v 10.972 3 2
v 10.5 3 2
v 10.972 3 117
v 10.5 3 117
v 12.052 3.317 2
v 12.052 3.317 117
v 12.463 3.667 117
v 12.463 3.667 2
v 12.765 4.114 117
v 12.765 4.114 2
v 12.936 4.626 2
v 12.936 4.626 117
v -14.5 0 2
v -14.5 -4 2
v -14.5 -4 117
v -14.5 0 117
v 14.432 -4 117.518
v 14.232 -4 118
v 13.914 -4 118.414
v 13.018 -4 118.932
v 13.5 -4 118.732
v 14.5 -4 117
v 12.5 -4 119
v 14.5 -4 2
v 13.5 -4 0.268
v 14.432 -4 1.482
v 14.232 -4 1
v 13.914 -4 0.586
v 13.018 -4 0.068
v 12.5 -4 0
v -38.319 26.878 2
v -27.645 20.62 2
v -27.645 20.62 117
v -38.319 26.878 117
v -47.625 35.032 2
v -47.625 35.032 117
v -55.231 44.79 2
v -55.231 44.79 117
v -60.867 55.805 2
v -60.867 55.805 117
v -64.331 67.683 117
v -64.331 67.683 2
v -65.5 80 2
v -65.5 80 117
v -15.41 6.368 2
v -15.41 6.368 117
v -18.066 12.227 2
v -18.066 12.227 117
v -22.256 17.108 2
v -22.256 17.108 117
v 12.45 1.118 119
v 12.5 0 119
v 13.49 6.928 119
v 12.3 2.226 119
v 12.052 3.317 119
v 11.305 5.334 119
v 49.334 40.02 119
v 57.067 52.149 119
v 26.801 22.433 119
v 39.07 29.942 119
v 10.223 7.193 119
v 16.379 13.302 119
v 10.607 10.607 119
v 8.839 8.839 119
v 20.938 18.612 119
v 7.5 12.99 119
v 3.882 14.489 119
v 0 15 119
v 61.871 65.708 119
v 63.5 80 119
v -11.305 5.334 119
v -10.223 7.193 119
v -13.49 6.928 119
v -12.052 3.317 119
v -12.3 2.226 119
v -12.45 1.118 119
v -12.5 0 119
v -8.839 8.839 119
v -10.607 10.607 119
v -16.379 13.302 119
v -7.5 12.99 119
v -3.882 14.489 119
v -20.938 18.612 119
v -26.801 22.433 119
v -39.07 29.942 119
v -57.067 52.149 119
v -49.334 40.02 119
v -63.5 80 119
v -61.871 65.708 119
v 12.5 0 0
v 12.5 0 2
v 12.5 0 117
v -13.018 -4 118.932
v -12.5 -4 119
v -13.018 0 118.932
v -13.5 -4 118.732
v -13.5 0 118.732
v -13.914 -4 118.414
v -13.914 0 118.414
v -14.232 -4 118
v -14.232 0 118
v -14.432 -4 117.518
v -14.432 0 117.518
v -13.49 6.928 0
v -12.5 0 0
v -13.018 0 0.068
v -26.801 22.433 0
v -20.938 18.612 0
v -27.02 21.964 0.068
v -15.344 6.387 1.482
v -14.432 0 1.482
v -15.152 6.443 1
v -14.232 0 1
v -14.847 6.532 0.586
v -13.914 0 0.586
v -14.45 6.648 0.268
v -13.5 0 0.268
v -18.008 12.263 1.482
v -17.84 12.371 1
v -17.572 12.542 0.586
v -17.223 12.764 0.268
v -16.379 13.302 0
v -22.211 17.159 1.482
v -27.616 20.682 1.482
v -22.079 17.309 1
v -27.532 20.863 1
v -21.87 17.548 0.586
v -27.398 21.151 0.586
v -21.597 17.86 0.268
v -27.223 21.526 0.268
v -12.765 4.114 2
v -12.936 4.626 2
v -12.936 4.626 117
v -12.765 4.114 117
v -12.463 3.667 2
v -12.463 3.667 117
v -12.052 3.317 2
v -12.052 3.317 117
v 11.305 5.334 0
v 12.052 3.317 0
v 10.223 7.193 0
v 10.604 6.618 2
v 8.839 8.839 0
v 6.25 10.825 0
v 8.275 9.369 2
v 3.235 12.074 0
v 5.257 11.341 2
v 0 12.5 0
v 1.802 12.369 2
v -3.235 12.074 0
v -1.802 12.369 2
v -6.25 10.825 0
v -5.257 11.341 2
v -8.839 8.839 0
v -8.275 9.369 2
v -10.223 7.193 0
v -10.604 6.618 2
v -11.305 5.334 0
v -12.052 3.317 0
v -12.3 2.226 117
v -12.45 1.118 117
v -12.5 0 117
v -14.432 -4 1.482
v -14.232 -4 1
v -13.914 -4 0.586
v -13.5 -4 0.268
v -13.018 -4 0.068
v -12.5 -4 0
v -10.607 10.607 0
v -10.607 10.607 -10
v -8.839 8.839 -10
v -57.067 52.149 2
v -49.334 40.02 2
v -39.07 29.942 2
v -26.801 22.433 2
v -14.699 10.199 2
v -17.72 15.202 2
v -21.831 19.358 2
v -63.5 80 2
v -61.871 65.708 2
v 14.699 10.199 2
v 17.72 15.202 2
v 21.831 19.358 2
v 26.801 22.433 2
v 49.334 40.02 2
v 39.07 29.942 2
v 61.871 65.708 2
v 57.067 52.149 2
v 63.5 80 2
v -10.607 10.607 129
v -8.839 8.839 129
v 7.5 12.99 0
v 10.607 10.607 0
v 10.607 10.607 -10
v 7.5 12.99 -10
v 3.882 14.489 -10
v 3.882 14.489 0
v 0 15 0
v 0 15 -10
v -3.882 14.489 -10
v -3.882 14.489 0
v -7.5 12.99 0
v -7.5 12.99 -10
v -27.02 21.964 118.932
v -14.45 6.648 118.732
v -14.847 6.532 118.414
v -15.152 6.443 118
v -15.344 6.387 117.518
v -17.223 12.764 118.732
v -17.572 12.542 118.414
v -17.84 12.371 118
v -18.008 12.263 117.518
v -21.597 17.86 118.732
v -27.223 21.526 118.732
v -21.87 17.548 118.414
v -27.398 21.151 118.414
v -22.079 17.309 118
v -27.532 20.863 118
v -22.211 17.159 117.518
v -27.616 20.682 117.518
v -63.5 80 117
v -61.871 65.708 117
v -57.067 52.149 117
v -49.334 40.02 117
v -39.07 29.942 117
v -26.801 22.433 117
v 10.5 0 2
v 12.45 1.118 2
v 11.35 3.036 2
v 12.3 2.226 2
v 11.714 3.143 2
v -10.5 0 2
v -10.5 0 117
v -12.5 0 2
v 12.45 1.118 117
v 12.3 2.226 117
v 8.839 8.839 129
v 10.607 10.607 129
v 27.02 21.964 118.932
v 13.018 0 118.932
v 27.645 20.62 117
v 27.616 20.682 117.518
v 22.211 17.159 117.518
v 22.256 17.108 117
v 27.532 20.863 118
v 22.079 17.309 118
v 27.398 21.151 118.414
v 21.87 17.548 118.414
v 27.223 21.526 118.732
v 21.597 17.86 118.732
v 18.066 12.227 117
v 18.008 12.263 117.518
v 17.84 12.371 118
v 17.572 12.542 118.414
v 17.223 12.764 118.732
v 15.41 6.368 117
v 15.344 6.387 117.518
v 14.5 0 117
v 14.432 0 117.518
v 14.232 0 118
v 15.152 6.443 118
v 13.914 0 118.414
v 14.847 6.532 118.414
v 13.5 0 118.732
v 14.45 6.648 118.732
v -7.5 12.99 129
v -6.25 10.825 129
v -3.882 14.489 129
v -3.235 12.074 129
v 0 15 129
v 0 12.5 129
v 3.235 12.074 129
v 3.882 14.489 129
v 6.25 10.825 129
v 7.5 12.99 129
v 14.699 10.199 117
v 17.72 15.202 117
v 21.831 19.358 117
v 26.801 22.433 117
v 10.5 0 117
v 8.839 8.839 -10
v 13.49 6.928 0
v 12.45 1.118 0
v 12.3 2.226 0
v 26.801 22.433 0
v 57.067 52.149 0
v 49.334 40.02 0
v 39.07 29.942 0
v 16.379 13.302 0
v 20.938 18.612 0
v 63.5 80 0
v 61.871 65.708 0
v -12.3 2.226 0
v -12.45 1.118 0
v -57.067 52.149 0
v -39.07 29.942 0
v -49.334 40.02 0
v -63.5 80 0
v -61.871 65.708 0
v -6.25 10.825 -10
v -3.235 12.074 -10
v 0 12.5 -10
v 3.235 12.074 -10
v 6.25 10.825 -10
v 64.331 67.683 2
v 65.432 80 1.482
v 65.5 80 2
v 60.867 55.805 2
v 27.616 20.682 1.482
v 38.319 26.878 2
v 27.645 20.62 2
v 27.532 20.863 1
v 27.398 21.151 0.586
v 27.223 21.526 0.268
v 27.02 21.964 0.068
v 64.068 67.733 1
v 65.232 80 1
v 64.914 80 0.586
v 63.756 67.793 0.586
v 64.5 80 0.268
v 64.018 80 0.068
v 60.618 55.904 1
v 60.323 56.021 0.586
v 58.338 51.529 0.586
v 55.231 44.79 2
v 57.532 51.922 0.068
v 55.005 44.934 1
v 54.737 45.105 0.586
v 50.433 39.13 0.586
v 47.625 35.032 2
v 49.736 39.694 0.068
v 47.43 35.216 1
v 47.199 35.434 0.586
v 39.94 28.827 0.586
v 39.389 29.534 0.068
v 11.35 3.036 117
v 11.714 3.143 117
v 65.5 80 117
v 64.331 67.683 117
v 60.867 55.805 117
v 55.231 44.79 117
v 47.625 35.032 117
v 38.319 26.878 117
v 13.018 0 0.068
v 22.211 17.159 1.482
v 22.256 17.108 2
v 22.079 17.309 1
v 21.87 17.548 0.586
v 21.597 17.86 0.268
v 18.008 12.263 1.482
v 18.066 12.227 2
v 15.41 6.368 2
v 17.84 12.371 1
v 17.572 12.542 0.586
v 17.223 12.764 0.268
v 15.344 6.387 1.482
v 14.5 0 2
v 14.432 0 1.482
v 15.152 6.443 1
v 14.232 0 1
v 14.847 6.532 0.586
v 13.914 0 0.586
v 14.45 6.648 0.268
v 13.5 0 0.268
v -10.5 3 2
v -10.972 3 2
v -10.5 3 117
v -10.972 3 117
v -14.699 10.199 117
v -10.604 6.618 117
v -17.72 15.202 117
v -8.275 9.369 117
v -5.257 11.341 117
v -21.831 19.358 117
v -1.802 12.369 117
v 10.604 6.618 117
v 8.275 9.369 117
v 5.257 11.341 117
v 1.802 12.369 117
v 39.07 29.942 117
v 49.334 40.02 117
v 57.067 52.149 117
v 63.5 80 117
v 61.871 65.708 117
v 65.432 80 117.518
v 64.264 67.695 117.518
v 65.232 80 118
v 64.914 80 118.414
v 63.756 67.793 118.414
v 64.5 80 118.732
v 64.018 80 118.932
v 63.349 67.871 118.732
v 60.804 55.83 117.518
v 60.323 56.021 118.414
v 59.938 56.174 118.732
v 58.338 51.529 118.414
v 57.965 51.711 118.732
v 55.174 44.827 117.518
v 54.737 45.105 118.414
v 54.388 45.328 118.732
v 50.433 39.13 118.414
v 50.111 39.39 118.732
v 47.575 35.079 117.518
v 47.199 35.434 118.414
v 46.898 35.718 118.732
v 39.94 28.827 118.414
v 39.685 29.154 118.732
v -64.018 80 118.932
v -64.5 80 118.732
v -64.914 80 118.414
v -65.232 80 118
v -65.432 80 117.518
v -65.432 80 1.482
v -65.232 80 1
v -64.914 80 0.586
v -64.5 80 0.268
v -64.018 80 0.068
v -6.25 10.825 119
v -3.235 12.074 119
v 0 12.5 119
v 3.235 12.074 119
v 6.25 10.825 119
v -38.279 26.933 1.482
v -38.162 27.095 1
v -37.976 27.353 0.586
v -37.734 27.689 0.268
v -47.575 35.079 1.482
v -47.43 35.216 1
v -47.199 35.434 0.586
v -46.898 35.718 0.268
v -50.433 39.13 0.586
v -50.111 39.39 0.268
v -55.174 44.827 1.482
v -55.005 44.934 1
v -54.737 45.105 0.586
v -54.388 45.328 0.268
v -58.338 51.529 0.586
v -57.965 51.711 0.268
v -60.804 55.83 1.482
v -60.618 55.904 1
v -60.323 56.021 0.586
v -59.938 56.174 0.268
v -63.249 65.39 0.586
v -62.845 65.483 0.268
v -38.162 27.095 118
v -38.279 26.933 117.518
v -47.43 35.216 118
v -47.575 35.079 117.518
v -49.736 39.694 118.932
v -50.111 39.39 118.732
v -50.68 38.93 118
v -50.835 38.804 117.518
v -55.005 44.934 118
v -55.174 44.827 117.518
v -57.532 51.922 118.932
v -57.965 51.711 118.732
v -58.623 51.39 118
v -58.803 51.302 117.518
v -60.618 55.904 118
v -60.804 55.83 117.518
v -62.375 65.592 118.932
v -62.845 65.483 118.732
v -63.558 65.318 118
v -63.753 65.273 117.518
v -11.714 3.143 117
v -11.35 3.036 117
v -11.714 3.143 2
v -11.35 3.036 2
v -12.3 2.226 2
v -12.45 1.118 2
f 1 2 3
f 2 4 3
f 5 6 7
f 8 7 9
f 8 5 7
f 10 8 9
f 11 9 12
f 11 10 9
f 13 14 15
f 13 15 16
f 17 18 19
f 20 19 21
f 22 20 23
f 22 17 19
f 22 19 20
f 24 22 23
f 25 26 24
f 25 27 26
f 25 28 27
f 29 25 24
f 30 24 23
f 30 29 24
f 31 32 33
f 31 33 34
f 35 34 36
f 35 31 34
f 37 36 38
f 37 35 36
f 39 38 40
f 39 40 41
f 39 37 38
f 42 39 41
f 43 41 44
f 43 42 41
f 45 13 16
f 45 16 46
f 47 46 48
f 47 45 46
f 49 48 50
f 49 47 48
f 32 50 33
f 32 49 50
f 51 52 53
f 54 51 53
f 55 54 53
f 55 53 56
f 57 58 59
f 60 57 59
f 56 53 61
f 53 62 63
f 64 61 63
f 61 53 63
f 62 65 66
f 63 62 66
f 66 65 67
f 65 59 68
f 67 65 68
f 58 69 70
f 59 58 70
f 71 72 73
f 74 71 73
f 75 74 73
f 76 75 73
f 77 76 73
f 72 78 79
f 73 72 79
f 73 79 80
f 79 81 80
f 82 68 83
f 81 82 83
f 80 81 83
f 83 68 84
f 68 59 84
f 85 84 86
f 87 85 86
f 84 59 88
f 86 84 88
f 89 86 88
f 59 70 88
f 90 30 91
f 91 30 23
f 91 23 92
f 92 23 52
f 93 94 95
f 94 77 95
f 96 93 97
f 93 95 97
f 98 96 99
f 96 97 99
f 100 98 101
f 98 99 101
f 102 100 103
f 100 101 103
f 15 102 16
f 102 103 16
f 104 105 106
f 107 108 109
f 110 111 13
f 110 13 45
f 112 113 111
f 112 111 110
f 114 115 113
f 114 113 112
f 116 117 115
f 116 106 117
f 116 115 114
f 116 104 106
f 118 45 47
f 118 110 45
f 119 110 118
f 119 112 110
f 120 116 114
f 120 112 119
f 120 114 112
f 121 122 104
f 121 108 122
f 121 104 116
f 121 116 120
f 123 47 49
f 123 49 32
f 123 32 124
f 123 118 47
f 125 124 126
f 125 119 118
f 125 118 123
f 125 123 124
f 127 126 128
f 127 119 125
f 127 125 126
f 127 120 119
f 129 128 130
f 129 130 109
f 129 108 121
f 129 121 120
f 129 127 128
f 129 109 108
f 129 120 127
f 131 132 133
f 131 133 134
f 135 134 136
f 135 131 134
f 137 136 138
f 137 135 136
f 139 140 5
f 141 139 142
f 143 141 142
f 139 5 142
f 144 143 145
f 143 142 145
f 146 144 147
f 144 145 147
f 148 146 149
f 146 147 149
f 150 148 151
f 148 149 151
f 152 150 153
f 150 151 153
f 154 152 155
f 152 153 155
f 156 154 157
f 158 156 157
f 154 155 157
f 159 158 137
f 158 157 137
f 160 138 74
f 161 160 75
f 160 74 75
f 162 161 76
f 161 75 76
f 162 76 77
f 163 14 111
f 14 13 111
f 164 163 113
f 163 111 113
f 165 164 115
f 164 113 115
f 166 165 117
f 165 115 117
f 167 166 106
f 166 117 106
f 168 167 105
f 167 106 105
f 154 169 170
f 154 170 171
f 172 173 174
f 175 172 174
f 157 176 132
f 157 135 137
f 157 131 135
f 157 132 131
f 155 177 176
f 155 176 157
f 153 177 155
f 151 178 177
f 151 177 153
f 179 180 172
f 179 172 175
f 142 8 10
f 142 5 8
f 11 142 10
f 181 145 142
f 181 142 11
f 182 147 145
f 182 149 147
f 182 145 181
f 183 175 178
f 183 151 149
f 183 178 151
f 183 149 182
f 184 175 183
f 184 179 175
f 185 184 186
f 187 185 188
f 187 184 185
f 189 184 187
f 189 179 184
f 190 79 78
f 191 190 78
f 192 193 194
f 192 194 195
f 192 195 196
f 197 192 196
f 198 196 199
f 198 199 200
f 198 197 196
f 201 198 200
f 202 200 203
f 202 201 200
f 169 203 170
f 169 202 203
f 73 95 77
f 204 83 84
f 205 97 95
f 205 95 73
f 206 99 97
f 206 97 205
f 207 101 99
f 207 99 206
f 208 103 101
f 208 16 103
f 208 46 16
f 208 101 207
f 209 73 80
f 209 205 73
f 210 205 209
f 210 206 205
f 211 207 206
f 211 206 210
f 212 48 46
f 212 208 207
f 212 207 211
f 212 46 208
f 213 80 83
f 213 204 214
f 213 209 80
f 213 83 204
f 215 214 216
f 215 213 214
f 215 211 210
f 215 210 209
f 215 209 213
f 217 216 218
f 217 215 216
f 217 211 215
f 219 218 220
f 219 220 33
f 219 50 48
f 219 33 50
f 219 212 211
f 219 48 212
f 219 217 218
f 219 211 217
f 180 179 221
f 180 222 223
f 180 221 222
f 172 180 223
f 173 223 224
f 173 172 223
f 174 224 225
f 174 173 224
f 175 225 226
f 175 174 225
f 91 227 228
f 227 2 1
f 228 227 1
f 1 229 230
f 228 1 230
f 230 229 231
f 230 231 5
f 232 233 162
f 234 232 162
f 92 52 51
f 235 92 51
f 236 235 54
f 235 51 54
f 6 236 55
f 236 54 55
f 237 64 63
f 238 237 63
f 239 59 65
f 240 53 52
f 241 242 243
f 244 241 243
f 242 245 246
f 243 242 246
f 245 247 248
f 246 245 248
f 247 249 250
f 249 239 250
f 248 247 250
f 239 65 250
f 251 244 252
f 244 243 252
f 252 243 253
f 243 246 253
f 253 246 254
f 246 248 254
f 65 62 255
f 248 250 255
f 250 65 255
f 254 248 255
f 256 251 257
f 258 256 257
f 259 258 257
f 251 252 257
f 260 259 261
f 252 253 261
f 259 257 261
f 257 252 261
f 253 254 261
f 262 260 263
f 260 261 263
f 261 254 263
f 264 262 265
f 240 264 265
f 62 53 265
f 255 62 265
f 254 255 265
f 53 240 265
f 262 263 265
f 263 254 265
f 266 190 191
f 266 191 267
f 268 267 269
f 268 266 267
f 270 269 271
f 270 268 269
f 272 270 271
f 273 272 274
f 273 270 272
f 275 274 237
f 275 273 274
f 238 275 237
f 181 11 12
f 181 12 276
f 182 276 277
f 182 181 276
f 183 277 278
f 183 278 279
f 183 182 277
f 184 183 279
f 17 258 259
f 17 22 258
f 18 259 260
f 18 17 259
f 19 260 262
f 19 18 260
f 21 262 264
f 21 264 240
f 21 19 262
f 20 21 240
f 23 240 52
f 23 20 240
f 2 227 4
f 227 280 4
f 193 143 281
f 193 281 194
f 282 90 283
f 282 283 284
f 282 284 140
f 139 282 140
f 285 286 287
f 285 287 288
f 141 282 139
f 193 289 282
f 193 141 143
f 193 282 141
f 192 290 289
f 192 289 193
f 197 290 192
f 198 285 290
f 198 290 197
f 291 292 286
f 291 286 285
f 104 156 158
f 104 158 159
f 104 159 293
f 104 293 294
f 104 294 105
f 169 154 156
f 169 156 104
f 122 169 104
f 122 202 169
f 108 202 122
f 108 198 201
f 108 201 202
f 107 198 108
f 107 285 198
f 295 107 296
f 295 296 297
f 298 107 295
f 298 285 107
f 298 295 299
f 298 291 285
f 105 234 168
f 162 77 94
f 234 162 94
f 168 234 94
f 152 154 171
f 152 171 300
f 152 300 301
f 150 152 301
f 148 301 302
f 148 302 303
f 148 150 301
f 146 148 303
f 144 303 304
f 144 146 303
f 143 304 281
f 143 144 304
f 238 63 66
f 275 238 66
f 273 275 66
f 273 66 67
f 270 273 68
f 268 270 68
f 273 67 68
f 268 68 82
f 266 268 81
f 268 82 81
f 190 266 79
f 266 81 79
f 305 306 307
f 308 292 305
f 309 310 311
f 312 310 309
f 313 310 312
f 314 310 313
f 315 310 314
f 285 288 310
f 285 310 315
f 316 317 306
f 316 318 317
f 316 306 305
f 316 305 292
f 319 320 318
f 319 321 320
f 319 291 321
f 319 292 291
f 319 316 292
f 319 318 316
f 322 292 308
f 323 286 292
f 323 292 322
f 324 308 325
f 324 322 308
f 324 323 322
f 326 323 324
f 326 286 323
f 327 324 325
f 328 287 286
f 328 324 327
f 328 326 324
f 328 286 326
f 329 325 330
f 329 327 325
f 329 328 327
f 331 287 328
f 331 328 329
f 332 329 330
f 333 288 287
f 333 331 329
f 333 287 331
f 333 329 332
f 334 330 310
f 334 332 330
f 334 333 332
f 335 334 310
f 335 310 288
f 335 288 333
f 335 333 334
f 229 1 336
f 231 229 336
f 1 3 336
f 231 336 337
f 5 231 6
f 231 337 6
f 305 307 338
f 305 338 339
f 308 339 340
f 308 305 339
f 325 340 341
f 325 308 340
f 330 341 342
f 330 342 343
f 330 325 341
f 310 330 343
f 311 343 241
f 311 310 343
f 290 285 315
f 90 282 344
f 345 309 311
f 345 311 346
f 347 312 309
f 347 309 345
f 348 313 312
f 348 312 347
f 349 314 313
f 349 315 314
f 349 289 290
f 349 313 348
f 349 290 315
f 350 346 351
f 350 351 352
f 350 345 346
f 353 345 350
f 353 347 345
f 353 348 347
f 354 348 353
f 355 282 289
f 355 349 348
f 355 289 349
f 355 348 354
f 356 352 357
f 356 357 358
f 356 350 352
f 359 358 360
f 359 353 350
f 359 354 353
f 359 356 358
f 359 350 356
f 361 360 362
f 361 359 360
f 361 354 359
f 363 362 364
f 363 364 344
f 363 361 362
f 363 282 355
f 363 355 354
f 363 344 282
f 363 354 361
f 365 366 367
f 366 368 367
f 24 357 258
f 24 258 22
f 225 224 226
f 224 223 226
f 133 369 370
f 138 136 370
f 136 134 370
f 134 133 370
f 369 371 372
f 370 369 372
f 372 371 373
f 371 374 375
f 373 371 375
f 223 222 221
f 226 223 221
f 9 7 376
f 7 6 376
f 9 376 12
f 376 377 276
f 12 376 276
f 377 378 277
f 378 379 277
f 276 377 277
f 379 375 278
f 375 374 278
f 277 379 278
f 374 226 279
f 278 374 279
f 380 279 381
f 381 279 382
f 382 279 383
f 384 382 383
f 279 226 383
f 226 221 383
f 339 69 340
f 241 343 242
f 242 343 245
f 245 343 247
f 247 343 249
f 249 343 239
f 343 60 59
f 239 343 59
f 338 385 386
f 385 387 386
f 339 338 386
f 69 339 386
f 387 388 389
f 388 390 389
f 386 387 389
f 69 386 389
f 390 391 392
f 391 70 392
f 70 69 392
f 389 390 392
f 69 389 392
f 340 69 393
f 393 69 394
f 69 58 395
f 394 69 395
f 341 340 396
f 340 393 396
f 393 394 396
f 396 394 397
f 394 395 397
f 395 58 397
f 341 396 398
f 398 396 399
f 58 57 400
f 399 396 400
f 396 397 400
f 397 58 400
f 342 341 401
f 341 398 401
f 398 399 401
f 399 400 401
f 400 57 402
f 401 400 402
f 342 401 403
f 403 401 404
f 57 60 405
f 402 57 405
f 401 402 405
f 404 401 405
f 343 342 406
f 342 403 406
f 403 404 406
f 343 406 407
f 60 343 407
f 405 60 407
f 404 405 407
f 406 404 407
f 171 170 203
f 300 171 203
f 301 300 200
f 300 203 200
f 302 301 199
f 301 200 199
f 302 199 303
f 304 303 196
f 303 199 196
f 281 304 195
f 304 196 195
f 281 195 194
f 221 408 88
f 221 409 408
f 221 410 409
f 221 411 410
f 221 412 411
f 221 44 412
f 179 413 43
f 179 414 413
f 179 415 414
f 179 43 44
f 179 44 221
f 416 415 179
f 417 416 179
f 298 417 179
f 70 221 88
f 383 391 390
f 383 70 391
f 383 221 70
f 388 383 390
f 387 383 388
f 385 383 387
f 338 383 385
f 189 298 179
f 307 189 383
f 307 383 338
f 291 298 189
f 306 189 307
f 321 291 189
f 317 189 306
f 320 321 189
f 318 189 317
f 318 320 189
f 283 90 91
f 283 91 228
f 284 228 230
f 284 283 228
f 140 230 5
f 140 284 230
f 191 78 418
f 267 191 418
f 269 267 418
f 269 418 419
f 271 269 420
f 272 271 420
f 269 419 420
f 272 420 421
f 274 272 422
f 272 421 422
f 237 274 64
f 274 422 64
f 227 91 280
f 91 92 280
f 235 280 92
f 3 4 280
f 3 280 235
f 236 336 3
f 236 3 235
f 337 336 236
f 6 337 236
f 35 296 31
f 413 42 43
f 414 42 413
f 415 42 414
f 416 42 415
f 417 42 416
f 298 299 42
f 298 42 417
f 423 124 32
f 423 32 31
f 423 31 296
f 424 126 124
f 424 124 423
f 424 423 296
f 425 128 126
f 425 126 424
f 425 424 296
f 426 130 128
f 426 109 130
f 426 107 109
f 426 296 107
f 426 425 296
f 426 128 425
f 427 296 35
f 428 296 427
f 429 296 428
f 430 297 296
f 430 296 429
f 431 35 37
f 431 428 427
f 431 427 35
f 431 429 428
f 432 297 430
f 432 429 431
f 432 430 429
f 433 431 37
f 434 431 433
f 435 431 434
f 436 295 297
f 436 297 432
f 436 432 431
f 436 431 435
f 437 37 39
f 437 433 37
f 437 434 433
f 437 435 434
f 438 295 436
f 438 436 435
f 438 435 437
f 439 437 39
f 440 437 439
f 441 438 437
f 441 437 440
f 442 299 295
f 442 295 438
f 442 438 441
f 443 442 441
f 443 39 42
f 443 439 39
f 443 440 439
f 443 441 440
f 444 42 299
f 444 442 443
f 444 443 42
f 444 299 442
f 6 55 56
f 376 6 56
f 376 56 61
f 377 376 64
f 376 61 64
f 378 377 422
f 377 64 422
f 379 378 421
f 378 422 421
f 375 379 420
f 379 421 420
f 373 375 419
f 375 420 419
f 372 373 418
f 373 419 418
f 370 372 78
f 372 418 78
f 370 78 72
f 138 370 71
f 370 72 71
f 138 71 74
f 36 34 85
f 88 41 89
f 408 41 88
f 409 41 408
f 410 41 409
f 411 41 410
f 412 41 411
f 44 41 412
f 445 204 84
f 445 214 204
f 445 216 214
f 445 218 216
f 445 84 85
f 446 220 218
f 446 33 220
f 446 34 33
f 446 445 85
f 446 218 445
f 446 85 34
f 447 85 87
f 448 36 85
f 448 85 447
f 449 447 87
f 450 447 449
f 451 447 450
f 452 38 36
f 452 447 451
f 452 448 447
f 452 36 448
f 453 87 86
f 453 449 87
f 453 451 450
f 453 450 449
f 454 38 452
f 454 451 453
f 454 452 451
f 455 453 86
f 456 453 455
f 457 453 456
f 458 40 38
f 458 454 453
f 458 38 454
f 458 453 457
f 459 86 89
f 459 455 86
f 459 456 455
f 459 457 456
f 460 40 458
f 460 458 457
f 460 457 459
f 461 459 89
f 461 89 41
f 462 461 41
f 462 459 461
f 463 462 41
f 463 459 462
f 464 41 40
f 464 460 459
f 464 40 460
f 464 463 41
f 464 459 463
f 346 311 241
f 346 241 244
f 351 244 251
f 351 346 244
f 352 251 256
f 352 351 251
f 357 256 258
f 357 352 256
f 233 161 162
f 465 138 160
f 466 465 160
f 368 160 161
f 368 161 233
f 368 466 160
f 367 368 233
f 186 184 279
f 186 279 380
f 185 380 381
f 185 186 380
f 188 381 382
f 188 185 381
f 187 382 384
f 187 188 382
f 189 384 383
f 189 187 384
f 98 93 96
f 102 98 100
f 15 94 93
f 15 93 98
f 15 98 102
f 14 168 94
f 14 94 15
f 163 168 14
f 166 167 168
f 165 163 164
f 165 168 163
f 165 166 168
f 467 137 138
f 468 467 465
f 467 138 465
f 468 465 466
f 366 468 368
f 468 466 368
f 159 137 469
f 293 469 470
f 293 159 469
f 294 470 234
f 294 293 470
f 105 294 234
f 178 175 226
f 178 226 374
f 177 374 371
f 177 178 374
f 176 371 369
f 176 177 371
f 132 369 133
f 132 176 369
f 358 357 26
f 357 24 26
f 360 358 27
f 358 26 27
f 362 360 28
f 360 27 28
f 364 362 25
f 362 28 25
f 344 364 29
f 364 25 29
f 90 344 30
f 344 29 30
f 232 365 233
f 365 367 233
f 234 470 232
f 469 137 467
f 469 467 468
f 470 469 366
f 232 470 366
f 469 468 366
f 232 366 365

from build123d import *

# Parameters (mm, degrees)
ESTRUSIONE_ESTRUSIONE1_DEPTH   = 119
ESTRUSIONE_ESTRUSIONE1_2_DEPTH = 119
ESTRUSIONE_ESTRUSIONE2_DEPTH   = 2
ESTRUSIONE_ESTRUSIONE4_START   = -119
ESTRUSIONE_ESTRUSIONE4_DEPTH   = 2
RACCORDO1_R                    = 2
TAGLIO_ESTRUSIONE1_DEPTH       = 120.0000001
TAGLIO_ESTRUSIONE2_DEPTH       = 2
TAGLIO_ESTRUSIONE3_DEPTH       = 2
ESTRUSIONE_ESTRUSIONE5_DEPTH   = 10
ESTRUSIONE_ESTRUSIONE6_DEPTH   = 10


with BuildPart() as part:
    # Schizzo1 → Estrusione-Estrusione1 (new body)
    with BuildSketch(Plane.XY):
        with BuildLine():
            Line((-65.5, 80), (-63.5, 80))
            ThreePointArc((-63.5, 80), (-53.544927077, 45.865108989), (-26.801077658, 22.433062993))
            ThreePointArc((-26.801077658, 22.433062993), (-17.720444684, 15.202229716), (-12.936270867, 4.626099707))
            ThreePointArc((-12.936270867, 4.626099707), (-12.246718209, 3.459253333), (-10.971532063, 3))
            Line((-10.971532063, 3), (-10.5, 3))
            Line((-10.5, 3), (-10.5, 0))
            Line((-10.5, 0), (-12.5, 0))
            Line((-12.5, 0), (-12.5, -4))
            Line((-12.5, -4), (-14.5, -4))
            Line((-14.5, -4), (-14.5, 0))
            ThreePointArc((-14.5, 0), (-18.06581275, 12.226794372), (-27.645206088, 20.619931119))
            ThreePointArc((-27.645206088, 20.619931119), (-55.231381473, 44.789994311), (-65.5, 80))
        make_face()
    extrude(amount=ESTRUSIONE_ESTRUSIONE1_DEPTH)



with BuildPart() as body_2:
    # Schizzo1 → Estrusione-Estrusione1 2 (new body)
    with BuildSketch(Plane.XY):
        with BuildLine():
            Line((63.5, 80), (65.5, 80))
            ThreePointArc((65.5, 80), (55.231381473, 44.789994311), (27.645206088, 20.619931119))
            ThreePointArc((27.645206088, 20.619931119), (18.06581275, 12.226794372), (14.5, 0))
            Line((14.5, 0), (14.5, -4))
            Line((14.5, -4), (12.5, -4))
            Line((12.5, -4), (12.5, 0))
            Line((12.5, 0), (10.5, 0))
            Line((10.5, 0), (10.5, 3))
            Line((10.5, 3), (10.971532063, 3))
            ThreePointArc((10.971532063, 3), (12.246718209, 3.459253333), (12.936270867, 4.626099707))
            ThreePointArc((12.936270867, 4.626099707), (17.720444684, 15.202229716), (26.801077658, 22.433062993))
            ThreePointArc((26.801077658, 22.433062993), (53.544927077, 45.865108989), (63.5, 80))
        make_face()
    extrude(amount=ESTRUSIONE_ESTRUSIONE1_2_DEPTH)


with BuildPart() as part_1:
    add(part.part)

    add(body_2.part)  # Estrusione-Estrusione2 merges body 2
    # Schizzo2 → Estrusione-Estrusione2 (add)
    with BuildSketch(Plane.XY.offset(119)):
        with BuildLine():
            Line((65.5, 80), (-65.5, 80))
            ThreePointArc((-65.5, 80), (-55.231381473, 44.789994311), (-27.645206088, 20.619931119))
            ThreePointArc((-27.645206088, 20.619931119), (-18.06581275, 12.226794372), (-14.5, 0))
            Line((-14.5, 0), (-14.5, -4))
            Line((-14.5, -4), (14.5, -4))
            Line((14.5, -4), (14.5, 0))
            ThreePointArc((14.5, 0), (18.06581275, 12.226794372), (27.645206088, 20.619931119))
            ThreePointArc((27.645206088, 20.619931119), (55.231381473, 44.789994311), (65.5, 80))
        make_face()
    extrude(amount=-ESTRUSIONE_ESTRUSIONE2_DEPTH)

    # Schizzo2<4> → Estrusione-Estrusione4 (add)
    with BuildSketch(Plane.XY.offset(119).offset(ESTRUSIONE_ESTRUSIONE4_START)):
        with BuildLine():
            ThreePointArc((27.645206088, 20.619931119), (55.231381473, 44.789994311), (65.5, 80))
            Line((65.5, 80), (63.5, 80))
            ThreePointArc((63.5, 80), (53.544927077, 45.865108989), (26.801077658, 22.433062993))
            ThreePointArc((26.801077658, 22.433062993), (17.720444684, 15.202229716), (12.936270867, 4.626099707))
            ThreePointArc((12.936270867, 4.626099707), (12.246718209, 3.459253333), (10.971532063, 3))
            Line((10.971532063, 3), (10.5, 3))
            Line((10.5, 3), (10.5, 0))
            Line((10.5, 0), (12.5, 0))
            Line((12.5, 0), (12.5, -4))
            Line((12.5, -4), (14.5, -4))
            Line((14.5, -4), (14.5, 0))
            ThreePointArc((14.5, 0), (18.06581275, 12.226794372), (27.645206088, 20.619931119))
        make_face()
        with BuildLine():
            ThreePointArc((26.801077658, 22.433062993), (53.544927077, 45.865108989), (63.5, 80))
            Line((63.5, 80), (-63.5, 80))
            ThreePointArc((-63.5, 80), (-53.544927077, 45.865108989), (-26.801077658, 22.433062993))
            ThreePointArc((-26.801077658, 22.433062993), (-17.720444684, 15.202229716), (-12.936270867, 4.626099707))
            ThreePointArc((-12.936270867, 4.626099707), (-12.246718209, 3.459253333), (-10.971532063, 3))
            Line((-10.971532063, 3), (-10.5, 3))
            Line((-10.5, 3), (-10.5, 0))
            Line((-10.5, 0), (-12.5, 0))
            Line((-12.5, 0), (-12.5, -4))
            Line((-12.5, -4), (12.5, -4))
            Line((12.5, -4), (12.5, 0))
            Line((12.5, 0), (10.5, 0))
            Line((10.5, 0), (10.5, 3))
            Line((10.5, 3), (10.971532063, 3))
            ThreePointArc((10.971532063, 3), (12.246718209, 3.459253333), (12.936270867, 4.626099707))
            ThreePointArc((12.936270867, 4.626099707), (17.720444684, 15.202229716), (26.801077658, 22.433062993))
        make_face()
        with BuildLine():
            ThreePointArc((-26.801077658, 22.433062993), (-53.544927077, 45.865108989), (-63.5, 80))
            Line((-63.5, 80), (-65.5, 80))
            ThreePointArc((-65.5, 80), (-55.231381473, 44.789994311), (-27.645206088, 20.619931119))
            ThreePointArc((-27.645206088, 20.619931119), (-18.06581275, 12.226794372), (-14.5, 0))
            Line((-14.5, 0), (-14.5, -4))
            Line((-14.5, -4), (-12.5, -4))
            Line((-12.5, -4), (-12.5, 0))
            Line((-12.5, 0), (-10.5, 0))
            Line((-10.5, 0), (-10.5, 3))
            Line((-10.5, 3), (-10.971532063, 3))
            ThreePointArc((-10.971532063, 3), (-12.246718209, 3.459253333), (-12.936270867, 4.626099707))
            ThreePointArc((-12.936270867, 4.626099707), (-17.720444684, 15.202229716), (-26.801077658, 22.433062993))
        make_face()
    extrude(amount=ESTRUSIONE_ESTRUSIONE4_DEPTH)

    # Raccordo1
    raccordo1_edges = [part_1.edges().sort_by_distance(p)[0] for p in [
        (-14.5, -2, 0),
        (-18.06581275, 12.226794372, 0),
        (-55.231381473, 44.789994311, 0),
        (-55.231381473, 44.789994311, 119),
        (-18.06581275, 12.226794372, 119),
        (-14.5, -2, 119),
        (14.5, -2, 119),
        (55.231381473, 44.789994311, 119),
        (18.06581275, 12.226794372, 119),
        (55.231381473, 44.789994311, 0),
        (14.5, -2, 0),
        (18.06581275, 12.226794372, 0),
    ]]
    fillet(raccordo1_edges, radius=RACCORDO1_R)

    # Schizzo3 → Taglio-Estrusione1 (cut, through all)
    with BuildSketch(Plane.XY.offset(119)):
        with BuildLine():
            Line((-12.5, 0), (-12.5, -4))
            Line((-12.5, -4), (12.5, -4))
            Line((12.5, -4), (12.5, 0))
            Line((12.5, 0), (10.5, 0))
            Line((10.5, 0), (10.5, 3))
            Line((10.5, 3), (10.971532063, 3))
            ThreePointArc((10.971532063, 3), (11.534472979, 3.080860212), (12.051894373, 3.316902475))
            ThreePointArc((12.051894373, 3.316902475), (0, 12.5), (-12.051894373, 3.316902475))
            ThreePointArc((-12.051894373, 3.316902475), (-11.534472979, 3.080860212), (-10.971532063, 3))
            Line((-10.971532063, 3), (-10.5, 3))
            Line((-10.5, 3), (-10.5, 0))
            Line((-10.5, 0), (-12.5, 0))
        make_face()
    extrude(amount=-TAGLIO_ESTRUSIONE1_DEPTH, mode=Mode.SUBTRACT)

    # Schizzo5 → Taglio-Estrusione2 (cut)
    with BuildSketch(Plane.XY.offset(119)):
        with BuildLine():
            Line((-12.5, 0), (12.5, 0))
            ThreePointArc((12.5, 0), (0, 12.5), (-12.5, 0))
        make_face()
    extrude(amount=-TAGLIO_ESTRUSIONE2_DEPTH, mode=Mode.SUBTRACT)

    # Schizzo7 → Taglio-Estrusione3 (cut)
    with BuildSketch(Plane(origin=(0, 0, 0), x_dir=(-1, 0, 0), z_dir=(0, 0, -1))):
        with BuildLine():
            Line((12.5, 0), (-12.5, 0))
            ThreePointArc((-12.5, 0), (0, 12.5), (12.5, 0))
        make_face()
    extrude(amount=-TAGLIO_ESTRUSIONE3_DEPTH, mode=Mode.SUBTRACT)

    # Schizzo8 → Estrusione-Estrusione5 (add)
    with BuildSketch(Plane(origin=(0, 0, 0), x_dir=(-1, 0, 0), z_dir=(0, 0, -1))):
        with BuildLine():
            Line((-8.838834765, 8.838834765), (-10.606601718, 10.606601718))
            ThreePointArc((-10.606601718, 10.606601718), (0, 15), (10.606601718, 10.606601718))
            Line((10.606601718, 10.606601718), (8.838834765, 8.838834765))
            ThreePointArc((8.838834765, 8.838834765), (0, 12.5), (-8.838834765, 8.838834765))
        make_face()
    extrude(amount=ESTRUSIONE_ESTRUSIONE5_DEPTH)

    # Schizzo10 → Estrusione-Estrusione6 (add)
    with BuildSketch(Plane.XY.offset(119)):
        with BuildLine():
            Line((8.838834765, 8.838834765), (10.606601718, 10.606601718))
            ThreePointArc((10.606601718, 10.606601718), (0, 15), (-10.606601718, 10.606601718))
            Line((-10.606601718, 10.606601718), (-8.838834765, 8.838834765))
            ThreePointArc((-8.838834765, 8.838834765), (0, 12.5), (8.838834765, 8.838834765))
        make_face()
    extrude(amount=ESTRUSIONE_ESTRUSIONE6_DEPTH)


solid = part_1.part
